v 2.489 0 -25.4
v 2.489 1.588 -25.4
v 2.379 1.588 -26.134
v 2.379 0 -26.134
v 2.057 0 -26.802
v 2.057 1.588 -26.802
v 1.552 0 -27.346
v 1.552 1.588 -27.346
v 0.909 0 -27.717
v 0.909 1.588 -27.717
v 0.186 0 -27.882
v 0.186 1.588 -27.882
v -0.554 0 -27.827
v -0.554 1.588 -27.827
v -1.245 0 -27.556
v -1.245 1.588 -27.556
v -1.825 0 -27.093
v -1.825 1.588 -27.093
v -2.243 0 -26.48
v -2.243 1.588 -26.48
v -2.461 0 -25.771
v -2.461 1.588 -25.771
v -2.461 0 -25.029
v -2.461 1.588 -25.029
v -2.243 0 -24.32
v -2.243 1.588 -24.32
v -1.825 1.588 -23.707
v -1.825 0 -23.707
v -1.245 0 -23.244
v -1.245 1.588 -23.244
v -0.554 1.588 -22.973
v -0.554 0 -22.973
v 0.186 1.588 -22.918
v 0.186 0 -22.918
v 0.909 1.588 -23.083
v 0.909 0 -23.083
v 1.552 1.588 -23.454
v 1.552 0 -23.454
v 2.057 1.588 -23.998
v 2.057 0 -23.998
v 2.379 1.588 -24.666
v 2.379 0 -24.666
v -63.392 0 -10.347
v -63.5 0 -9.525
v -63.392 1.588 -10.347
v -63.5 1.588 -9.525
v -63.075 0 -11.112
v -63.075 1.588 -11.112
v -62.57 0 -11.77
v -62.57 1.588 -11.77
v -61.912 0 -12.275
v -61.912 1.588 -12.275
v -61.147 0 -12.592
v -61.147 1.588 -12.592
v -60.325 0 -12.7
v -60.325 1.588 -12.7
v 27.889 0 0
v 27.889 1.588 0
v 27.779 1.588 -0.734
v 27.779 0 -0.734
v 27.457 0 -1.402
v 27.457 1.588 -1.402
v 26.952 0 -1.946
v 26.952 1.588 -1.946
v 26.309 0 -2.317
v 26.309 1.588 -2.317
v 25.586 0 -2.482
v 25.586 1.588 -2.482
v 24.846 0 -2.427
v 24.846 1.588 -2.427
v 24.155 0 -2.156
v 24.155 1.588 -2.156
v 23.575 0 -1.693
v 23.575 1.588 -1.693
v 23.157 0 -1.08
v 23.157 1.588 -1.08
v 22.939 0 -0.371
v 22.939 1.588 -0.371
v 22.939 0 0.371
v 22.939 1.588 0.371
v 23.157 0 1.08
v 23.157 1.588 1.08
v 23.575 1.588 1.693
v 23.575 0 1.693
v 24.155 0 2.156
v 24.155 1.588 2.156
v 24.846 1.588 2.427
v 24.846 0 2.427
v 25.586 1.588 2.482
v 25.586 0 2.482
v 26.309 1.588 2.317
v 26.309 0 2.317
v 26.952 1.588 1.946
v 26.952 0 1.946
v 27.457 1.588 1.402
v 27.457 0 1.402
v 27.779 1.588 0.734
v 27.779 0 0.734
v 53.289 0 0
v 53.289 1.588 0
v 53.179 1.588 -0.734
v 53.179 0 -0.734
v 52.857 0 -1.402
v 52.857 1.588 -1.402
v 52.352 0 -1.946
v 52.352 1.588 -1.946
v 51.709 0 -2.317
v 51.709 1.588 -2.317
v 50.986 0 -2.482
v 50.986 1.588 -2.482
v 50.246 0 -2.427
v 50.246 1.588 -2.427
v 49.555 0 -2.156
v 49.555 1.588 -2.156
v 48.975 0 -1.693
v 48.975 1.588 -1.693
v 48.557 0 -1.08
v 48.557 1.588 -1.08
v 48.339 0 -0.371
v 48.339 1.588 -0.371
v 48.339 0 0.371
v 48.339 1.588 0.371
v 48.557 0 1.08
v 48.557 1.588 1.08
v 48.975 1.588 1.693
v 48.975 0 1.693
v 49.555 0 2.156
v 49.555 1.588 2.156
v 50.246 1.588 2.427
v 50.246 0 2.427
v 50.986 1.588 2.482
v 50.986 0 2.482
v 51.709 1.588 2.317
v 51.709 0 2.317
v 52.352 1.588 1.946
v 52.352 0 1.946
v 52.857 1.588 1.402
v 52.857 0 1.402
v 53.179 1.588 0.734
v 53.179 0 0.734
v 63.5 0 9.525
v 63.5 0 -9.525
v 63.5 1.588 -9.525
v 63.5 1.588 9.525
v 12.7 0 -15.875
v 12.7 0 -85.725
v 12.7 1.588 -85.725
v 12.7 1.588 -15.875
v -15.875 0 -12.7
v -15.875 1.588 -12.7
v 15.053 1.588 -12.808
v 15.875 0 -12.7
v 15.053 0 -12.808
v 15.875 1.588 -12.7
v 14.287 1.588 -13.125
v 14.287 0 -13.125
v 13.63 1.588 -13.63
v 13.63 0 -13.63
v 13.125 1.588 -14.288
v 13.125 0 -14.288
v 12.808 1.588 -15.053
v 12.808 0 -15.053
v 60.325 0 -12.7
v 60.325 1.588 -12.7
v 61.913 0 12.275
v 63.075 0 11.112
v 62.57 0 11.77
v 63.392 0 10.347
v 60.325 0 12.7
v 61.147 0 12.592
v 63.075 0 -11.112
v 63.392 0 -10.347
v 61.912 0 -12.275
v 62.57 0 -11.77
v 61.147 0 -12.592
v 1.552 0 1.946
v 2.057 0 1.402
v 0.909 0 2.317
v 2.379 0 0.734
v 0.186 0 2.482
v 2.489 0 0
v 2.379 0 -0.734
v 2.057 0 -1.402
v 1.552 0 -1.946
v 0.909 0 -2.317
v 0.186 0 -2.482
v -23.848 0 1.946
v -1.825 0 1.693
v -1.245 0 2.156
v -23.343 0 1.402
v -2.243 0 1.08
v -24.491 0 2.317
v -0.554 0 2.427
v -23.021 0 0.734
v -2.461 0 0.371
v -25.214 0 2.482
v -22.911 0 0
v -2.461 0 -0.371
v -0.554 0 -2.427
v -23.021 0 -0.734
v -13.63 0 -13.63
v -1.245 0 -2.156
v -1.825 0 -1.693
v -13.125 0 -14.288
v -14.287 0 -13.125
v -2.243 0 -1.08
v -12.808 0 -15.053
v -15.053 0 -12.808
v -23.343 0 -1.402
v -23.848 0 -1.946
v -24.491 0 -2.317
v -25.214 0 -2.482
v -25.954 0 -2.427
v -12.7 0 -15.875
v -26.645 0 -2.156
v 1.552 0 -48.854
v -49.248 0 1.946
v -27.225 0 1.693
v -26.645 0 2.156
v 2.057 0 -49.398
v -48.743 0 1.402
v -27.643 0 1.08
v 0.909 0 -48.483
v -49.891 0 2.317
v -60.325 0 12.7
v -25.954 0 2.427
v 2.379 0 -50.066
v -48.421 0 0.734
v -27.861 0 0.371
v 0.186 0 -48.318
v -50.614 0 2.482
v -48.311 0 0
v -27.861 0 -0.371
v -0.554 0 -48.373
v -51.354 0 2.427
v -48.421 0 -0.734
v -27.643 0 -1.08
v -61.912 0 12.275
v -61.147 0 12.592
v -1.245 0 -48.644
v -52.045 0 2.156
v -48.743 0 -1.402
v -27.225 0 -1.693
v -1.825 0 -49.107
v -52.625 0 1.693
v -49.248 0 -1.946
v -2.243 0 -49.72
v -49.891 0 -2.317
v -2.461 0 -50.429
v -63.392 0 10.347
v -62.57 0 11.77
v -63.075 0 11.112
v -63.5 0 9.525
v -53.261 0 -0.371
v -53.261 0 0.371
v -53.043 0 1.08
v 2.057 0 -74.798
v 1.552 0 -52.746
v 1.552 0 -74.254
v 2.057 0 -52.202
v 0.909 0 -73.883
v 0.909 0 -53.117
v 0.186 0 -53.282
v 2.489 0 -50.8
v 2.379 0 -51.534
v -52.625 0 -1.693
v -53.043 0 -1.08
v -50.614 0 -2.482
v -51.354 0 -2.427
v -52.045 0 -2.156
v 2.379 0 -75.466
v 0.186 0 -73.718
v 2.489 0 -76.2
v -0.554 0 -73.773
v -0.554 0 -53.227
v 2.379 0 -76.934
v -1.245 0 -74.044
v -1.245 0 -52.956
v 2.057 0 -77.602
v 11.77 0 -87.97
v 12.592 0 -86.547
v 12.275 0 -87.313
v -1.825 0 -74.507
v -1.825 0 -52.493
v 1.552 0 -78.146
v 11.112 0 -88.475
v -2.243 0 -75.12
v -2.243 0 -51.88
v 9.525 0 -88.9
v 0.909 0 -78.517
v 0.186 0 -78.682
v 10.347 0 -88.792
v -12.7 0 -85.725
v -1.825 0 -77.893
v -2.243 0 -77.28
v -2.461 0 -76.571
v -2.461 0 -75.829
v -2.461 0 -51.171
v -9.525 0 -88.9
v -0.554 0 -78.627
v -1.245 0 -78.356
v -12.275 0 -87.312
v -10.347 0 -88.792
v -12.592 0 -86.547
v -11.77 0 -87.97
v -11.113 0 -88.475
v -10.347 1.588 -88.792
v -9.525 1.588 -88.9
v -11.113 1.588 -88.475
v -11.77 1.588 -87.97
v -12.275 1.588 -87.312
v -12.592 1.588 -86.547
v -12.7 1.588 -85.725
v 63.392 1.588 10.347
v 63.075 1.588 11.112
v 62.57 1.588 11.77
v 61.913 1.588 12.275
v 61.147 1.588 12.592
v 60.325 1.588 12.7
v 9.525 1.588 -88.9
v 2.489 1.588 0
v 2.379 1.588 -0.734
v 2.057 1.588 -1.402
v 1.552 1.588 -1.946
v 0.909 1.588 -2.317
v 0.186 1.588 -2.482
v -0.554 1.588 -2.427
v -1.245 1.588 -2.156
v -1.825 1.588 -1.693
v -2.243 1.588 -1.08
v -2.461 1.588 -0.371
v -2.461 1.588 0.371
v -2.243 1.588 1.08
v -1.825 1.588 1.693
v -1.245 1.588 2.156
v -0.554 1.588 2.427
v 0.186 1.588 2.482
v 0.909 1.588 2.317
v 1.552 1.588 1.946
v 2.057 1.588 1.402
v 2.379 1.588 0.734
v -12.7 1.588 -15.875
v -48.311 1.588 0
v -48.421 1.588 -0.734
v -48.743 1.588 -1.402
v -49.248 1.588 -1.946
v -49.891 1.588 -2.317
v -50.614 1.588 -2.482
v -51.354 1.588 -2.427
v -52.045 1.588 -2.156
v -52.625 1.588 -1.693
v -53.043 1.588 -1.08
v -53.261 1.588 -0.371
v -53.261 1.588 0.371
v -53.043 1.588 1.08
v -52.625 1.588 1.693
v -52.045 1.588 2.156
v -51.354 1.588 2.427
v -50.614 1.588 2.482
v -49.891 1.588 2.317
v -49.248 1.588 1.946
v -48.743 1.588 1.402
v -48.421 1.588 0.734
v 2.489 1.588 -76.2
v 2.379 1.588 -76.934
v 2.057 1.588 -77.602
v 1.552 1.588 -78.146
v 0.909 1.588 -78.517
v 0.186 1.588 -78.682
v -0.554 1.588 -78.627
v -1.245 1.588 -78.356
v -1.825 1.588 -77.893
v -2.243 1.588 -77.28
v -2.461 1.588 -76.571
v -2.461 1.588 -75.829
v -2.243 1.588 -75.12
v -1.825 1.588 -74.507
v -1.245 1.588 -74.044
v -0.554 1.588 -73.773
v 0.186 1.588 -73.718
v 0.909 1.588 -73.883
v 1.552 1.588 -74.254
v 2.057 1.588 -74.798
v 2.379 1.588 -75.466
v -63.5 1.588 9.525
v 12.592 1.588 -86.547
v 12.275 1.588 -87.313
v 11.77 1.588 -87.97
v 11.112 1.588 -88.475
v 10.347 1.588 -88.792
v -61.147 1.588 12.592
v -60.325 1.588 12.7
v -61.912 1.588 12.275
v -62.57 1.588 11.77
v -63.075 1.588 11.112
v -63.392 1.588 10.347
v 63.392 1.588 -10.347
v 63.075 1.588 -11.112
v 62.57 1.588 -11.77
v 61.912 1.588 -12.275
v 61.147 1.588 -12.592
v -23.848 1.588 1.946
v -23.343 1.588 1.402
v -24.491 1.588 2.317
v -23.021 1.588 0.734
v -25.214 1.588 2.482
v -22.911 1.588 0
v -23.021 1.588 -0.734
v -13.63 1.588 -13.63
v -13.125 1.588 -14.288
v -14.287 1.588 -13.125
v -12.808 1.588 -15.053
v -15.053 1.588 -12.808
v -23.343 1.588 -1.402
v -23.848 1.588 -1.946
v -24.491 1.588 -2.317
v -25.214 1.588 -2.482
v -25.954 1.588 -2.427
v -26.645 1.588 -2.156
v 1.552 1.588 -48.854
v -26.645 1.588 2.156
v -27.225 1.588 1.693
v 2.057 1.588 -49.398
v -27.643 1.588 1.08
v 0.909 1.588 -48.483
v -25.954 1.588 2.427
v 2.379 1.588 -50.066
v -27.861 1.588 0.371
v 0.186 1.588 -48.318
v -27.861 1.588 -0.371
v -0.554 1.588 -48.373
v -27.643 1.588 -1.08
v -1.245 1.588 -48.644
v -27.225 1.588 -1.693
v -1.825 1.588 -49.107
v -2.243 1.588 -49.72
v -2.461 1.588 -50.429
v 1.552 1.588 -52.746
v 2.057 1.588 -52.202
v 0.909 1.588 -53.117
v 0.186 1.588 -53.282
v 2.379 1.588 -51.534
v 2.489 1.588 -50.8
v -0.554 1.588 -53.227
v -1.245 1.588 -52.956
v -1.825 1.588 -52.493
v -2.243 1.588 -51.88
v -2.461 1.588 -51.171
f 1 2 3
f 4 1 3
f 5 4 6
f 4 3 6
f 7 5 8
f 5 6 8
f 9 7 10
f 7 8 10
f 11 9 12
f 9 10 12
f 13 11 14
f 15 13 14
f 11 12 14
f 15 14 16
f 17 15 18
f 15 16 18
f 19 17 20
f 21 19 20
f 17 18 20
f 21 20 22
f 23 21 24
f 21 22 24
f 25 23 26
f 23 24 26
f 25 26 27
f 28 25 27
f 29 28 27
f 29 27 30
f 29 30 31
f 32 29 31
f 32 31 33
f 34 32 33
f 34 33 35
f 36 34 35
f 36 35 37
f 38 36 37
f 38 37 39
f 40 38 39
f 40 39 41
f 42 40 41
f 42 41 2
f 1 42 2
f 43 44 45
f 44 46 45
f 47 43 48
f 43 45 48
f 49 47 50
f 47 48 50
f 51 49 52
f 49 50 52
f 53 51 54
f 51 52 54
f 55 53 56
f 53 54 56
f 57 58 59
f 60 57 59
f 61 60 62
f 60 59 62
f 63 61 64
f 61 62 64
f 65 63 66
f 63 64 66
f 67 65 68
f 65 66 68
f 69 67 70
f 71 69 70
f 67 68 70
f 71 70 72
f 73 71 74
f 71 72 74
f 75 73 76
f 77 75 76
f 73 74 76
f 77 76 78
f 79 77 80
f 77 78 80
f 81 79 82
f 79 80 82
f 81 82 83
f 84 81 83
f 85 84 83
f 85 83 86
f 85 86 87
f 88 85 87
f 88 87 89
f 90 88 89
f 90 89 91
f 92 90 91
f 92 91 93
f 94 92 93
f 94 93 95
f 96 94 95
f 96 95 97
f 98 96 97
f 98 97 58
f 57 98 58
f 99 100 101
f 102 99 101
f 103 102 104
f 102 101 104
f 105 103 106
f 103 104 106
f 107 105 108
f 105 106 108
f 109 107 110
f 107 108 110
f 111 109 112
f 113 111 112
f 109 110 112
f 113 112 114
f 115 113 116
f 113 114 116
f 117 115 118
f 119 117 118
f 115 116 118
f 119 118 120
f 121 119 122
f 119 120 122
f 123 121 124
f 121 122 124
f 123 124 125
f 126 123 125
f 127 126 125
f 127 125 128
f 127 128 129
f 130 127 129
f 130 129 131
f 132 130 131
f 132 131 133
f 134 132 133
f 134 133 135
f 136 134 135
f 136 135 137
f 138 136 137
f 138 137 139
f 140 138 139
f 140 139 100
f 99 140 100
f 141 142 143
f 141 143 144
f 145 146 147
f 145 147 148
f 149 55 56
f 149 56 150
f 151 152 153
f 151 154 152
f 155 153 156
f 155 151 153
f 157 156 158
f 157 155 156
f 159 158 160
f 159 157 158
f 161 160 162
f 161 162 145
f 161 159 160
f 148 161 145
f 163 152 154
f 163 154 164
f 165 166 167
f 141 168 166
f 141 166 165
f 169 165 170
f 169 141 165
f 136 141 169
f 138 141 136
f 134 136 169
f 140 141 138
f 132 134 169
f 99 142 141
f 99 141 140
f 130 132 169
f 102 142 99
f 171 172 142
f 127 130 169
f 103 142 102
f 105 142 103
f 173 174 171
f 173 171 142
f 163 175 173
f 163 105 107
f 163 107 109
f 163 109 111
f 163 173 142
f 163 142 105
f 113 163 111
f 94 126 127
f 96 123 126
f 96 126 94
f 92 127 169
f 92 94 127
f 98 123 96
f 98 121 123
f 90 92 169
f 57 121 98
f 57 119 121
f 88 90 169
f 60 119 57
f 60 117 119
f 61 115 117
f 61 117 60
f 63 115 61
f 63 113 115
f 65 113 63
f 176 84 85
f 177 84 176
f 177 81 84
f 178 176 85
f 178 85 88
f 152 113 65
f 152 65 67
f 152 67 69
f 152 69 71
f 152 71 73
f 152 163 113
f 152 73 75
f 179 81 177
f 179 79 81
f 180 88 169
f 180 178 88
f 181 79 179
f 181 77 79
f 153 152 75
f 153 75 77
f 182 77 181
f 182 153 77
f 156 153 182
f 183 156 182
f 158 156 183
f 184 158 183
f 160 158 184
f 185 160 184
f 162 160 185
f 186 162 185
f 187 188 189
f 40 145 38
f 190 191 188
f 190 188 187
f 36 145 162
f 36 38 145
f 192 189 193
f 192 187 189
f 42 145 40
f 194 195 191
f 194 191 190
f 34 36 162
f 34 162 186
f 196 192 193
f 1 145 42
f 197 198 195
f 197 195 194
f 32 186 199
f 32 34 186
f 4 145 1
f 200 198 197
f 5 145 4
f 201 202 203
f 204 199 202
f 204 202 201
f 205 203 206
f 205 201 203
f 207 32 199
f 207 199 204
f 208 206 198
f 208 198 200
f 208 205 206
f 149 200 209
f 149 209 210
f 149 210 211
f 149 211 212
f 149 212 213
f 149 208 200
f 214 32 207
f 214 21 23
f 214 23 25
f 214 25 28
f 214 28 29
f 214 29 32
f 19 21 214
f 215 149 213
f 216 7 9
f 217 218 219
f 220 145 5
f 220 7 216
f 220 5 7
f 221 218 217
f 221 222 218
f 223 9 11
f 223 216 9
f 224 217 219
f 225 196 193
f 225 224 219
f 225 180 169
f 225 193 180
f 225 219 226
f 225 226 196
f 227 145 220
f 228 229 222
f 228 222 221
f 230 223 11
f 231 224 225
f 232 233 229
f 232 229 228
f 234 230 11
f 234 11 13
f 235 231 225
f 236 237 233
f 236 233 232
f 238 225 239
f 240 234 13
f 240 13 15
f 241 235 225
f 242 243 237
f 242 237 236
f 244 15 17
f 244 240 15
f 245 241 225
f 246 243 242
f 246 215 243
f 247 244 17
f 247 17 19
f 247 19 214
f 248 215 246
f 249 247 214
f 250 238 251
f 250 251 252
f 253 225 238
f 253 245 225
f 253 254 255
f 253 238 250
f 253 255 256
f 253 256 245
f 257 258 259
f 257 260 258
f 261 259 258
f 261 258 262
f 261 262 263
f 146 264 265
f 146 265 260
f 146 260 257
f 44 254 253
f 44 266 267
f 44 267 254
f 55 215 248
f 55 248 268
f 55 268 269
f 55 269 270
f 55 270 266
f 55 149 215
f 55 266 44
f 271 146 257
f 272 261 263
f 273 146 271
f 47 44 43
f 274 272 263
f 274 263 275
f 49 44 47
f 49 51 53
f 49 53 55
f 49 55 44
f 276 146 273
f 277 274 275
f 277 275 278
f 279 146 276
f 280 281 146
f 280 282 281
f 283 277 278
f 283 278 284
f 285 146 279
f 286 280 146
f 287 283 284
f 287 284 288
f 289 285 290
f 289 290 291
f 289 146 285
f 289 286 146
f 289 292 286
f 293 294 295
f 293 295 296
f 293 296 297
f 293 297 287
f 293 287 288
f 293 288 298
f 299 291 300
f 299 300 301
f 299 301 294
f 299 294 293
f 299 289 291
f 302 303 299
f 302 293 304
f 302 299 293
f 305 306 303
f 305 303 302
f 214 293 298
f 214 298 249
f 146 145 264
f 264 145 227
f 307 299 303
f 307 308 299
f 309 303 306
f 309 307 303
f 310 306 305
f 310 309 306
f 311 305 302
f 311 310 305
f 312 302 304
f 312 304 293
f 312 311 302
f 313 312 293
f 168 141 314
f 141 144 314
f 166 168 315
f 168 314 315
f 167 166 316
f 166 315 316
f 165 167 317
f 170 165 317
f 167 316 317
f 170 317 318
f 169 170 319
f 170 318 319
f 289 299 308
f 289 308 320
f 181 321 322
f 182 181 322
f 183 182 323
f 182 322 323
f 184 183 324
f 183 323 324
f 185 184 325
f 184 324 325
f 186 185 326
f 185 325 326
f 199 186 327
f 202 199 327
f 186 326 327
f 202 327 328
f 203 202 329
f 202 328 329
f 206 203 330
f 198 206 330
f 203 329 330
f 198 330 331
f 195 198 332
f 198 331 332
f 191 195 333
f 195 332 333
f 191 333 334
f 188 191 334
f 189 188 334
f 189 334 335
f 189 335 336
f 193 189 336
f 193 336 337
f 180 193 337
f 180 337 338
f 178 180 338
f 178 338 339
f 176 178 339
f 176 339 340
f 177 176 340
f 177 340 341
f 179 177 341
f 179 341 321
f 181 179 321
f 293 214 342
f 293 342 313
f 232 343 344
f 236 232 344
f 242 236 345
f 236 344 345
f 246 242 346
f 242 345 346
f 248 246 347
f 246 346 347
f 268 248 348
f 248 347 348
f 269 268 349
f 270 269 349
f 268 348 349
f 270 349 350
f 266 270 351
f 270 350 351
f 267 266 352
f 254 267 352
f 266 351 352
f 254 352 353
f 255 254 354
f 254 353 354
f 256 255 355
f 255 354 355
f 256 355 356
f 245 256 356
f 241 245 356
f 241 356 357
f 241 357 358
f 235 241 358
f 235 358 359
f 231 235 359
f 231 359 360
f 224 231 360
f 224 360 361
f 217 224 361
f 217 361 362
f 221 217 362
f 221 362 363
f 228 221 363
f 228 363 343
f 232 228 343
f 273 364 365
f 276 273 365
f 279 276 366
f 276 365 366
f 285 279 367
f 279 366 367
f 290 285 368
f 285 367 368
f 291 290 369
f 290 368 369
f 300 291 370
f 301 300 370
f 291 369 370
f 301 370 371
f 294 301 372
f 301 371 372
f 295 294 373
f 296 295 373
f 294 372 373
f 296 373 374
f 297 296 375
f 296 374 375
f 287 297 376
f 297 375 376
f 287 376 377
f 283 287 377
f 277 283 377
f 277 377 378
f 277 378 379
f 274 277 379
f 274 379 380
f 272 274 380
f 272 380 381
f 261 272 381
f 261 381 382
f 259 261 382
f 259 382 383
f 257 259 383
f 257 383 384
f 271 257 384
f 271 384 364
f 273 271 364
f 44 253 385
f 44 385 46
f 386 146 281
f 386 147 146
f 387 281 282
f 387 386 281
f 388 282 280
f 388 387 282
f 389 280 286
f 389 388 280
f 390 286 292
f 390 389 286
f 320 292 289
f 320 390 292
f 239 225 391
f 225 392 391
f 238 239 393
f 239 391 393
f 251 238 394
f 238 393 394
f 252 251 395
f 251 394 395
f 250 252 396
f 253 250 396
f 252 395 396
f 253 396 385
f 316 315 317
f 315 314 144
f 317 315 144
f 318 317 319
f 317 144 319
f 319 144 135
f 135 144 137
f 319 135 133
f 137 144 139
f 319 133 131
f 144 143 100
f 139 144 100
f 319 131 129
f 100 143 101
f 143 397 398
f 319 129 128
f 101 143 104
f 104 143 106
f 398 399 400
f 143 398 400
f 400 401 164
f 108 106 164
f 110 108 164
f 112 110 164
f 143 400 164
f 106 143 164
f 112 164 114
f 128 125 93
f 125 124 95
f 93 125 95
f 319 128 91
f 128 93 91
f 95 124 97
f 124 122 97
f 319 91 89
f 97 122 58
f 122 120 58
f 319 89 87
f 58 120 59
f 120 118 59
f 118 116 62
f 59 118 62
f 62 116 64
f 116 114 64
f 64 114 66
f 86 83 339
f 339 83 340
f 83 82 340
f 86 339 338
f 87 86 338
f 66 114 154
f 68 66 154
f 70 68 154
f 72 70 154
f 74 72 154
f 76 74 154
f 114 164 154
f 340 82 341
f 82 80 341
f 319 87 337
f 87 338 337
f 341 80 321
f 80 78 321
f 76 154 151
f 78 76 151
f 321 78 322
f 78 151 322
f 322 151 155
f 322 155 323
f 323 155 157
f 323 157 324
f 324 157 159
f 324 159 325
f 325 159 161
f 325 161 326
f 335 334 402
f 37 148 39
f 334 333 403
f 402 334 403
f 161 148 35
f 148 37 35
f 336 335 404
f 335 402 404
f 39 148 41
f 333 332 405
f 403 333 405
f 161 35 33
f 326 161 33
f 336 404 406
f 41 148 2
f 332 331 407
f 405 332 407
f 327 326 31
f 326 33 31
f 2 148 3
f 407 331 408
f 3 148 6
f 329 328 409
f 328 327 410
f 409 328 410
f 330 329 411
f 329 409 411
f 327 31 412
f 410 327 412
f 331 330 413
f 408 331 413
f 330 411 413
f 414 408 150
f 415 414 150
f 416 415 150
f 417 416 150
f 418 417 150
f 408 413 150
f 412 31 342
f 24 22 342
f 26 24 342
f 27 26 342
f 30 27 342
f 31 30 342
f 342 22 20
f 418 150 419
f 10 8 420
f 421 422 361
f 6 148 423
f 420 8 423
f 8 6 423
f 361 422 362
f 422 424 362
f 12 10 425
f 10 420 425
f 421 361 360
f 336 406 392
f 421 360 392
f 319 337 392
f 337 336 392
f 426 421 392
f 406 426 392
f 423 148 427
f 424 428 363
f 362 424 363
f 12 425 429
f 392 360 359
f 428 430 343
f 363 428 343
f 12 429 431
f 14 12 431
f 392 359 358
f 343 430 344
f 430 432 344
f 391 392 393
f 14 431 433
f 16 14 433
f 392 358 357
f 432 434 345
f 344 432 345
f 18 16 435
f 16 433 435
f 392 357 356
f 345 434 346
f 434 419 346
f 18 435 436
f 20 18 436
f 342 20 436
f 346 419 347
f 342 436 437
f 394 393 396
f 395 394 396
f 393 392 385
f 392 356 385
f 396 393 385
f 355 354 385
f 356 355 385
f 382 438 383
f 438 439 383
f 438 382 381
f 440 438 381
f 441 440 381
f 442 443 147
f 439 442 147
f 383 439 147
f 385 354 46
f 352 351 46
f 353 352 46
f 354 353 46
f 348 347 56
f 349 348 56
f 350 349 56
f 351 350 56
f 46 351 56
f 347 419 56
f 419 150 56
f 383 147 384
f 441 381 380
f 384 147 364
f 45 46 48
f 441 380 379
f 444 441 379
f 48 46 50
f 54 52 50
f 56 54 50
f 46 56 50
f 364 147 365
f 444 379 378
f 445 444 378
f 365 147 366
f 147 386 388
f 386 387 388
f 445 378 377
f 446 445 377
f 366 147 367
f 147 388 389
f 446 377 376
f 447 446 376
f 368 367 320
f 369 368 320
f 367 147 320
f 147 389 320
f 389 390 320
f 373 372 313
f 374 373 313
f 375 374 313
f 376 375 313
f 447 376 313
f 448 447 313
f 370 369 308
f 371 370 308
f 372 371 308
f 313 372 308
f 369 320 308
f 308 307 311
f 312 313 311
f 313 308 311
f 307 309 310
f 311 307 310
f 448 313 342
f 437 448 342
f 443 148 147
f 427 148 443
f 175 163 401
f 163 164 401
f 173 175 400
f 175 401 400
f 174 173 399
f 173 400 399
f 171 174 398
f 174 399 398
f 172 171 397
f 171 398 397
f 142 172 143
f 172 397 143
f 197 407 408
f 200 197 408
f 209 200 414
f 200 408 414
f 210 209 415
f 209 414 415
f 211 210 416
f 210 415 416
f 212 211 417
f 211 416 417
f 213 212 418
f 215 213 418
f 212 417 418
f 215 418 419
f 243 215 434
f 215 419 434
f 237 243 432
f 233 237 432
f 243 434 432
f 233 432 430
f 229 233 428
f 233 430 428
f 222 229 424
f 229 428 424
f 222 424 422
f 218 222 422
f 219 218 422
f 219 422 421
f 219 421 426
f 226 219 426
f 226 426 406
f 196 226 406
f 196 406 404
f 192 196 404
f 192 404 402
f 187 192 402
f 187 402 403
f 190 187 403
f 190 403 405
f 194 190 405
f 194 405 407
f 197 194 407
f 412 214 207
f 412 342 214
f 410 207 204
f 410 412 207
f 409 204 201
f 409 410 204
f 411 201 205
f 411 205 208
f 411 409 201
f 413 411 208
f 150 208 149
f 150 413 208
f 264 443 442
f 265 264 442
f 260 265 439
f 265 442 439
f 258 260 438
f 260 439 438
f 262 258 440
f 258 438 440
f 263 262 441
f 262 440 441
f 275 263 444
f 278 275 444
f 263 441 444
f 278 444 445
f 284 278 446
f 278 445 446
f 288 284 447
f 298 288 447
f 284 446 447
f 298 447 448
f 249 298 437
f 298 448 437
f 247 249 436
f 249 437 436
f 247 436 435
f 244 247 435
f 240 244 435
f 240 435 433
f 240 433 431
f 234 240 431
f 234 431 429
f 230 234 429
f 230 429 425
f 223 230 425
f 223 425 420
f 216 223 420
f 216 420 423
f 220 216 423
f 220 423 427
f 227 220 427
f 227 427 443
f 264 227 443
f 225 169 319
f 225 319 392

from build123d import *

# Parameters (mm, degrees)
BOSS_EXTRUDE1_DEPTH     = 1.5875
SKETCH2_R               = 2.4892
CUT_EXTRUDE1_DEPTH      = 1
CUT_EXTRUDE1_DEPTH_BACK = 2.5875
FILLET1_R               = 3.175


with BuildPart() as part:
    # Sketch1 → Boss-Extrude1 (new body)
    with BuildSketch(Plane(origin=(0, 0, 0), x_dir=(1, 0, 0), z_dir=(0, 1, 0))):
        Polygon((12.7, 12.7), (63.5, 12.7), (63.5, -12.7), (-63.5, -12.7), (-63.5, 12.7), (-12.7, 12.7), (-12.7, 88.9), (12.7, 88.9), align=None)
    extrude(amount=BOSS_EXTRUDE1_DEPTH)

    # Sketch2 → Cut-Extrude1 (cut, two sides)
    with BuildSketch(Plane(origin=(0, 1.5875, 0), x_dir=(1, 0, 0), z_dir=(0, 1, 0))) as cut_extrude1_sk:
        Circle(SKETCH2_R)
        with Locations((0, 25.4)):
            Circle(SKETCH2_R)
        with Locations((0, 50.8)):
            Circle(SKETCH2_R)
        with Locations((0, 76.2)):
            Circle(SKETCH2_R)
        with Locations((-25.4, 0)):
            Circle(SKETCH2_R)
        with Locations((-50.8, 0)):
            Circle(SKETCH2_R)
        with Locations((25.4, 0)):
            Circle(SKETCH2_R)
        with Locations((50.8, 0)):
            Circle(SKETCH2_R)
    extrude(amount=CUT_EXTRUDE1_DEPTH, mode=Mode.SUBTRACT)
    extrude(cut_extrude1_sk.sketch, amount=-CUT_EXTRUDE1_DEPTH_BACK, mode=Mode.SUBTRACT)

    # Fillet1
    fillet1_edges = [part.edges().sort_by_distance(p)[0] for p in [
        (63.5, 0.79375, 12.7),
        (-63.5, 0.79375, 12.7),
        (-63.5, 0.79375, -12.7),
        (-12.7, 0.79375, -12.7),
        (-12.7, 0.79375, -88.9),
        (12.7, 0.79375, -88.9),
        (12.7, 0.79375, -12.7),
        (63.5, 0.79375, -12.7),
    ]]
    fillet(fillet1_edges, radius=FILLET1_R)


solid = part.part
